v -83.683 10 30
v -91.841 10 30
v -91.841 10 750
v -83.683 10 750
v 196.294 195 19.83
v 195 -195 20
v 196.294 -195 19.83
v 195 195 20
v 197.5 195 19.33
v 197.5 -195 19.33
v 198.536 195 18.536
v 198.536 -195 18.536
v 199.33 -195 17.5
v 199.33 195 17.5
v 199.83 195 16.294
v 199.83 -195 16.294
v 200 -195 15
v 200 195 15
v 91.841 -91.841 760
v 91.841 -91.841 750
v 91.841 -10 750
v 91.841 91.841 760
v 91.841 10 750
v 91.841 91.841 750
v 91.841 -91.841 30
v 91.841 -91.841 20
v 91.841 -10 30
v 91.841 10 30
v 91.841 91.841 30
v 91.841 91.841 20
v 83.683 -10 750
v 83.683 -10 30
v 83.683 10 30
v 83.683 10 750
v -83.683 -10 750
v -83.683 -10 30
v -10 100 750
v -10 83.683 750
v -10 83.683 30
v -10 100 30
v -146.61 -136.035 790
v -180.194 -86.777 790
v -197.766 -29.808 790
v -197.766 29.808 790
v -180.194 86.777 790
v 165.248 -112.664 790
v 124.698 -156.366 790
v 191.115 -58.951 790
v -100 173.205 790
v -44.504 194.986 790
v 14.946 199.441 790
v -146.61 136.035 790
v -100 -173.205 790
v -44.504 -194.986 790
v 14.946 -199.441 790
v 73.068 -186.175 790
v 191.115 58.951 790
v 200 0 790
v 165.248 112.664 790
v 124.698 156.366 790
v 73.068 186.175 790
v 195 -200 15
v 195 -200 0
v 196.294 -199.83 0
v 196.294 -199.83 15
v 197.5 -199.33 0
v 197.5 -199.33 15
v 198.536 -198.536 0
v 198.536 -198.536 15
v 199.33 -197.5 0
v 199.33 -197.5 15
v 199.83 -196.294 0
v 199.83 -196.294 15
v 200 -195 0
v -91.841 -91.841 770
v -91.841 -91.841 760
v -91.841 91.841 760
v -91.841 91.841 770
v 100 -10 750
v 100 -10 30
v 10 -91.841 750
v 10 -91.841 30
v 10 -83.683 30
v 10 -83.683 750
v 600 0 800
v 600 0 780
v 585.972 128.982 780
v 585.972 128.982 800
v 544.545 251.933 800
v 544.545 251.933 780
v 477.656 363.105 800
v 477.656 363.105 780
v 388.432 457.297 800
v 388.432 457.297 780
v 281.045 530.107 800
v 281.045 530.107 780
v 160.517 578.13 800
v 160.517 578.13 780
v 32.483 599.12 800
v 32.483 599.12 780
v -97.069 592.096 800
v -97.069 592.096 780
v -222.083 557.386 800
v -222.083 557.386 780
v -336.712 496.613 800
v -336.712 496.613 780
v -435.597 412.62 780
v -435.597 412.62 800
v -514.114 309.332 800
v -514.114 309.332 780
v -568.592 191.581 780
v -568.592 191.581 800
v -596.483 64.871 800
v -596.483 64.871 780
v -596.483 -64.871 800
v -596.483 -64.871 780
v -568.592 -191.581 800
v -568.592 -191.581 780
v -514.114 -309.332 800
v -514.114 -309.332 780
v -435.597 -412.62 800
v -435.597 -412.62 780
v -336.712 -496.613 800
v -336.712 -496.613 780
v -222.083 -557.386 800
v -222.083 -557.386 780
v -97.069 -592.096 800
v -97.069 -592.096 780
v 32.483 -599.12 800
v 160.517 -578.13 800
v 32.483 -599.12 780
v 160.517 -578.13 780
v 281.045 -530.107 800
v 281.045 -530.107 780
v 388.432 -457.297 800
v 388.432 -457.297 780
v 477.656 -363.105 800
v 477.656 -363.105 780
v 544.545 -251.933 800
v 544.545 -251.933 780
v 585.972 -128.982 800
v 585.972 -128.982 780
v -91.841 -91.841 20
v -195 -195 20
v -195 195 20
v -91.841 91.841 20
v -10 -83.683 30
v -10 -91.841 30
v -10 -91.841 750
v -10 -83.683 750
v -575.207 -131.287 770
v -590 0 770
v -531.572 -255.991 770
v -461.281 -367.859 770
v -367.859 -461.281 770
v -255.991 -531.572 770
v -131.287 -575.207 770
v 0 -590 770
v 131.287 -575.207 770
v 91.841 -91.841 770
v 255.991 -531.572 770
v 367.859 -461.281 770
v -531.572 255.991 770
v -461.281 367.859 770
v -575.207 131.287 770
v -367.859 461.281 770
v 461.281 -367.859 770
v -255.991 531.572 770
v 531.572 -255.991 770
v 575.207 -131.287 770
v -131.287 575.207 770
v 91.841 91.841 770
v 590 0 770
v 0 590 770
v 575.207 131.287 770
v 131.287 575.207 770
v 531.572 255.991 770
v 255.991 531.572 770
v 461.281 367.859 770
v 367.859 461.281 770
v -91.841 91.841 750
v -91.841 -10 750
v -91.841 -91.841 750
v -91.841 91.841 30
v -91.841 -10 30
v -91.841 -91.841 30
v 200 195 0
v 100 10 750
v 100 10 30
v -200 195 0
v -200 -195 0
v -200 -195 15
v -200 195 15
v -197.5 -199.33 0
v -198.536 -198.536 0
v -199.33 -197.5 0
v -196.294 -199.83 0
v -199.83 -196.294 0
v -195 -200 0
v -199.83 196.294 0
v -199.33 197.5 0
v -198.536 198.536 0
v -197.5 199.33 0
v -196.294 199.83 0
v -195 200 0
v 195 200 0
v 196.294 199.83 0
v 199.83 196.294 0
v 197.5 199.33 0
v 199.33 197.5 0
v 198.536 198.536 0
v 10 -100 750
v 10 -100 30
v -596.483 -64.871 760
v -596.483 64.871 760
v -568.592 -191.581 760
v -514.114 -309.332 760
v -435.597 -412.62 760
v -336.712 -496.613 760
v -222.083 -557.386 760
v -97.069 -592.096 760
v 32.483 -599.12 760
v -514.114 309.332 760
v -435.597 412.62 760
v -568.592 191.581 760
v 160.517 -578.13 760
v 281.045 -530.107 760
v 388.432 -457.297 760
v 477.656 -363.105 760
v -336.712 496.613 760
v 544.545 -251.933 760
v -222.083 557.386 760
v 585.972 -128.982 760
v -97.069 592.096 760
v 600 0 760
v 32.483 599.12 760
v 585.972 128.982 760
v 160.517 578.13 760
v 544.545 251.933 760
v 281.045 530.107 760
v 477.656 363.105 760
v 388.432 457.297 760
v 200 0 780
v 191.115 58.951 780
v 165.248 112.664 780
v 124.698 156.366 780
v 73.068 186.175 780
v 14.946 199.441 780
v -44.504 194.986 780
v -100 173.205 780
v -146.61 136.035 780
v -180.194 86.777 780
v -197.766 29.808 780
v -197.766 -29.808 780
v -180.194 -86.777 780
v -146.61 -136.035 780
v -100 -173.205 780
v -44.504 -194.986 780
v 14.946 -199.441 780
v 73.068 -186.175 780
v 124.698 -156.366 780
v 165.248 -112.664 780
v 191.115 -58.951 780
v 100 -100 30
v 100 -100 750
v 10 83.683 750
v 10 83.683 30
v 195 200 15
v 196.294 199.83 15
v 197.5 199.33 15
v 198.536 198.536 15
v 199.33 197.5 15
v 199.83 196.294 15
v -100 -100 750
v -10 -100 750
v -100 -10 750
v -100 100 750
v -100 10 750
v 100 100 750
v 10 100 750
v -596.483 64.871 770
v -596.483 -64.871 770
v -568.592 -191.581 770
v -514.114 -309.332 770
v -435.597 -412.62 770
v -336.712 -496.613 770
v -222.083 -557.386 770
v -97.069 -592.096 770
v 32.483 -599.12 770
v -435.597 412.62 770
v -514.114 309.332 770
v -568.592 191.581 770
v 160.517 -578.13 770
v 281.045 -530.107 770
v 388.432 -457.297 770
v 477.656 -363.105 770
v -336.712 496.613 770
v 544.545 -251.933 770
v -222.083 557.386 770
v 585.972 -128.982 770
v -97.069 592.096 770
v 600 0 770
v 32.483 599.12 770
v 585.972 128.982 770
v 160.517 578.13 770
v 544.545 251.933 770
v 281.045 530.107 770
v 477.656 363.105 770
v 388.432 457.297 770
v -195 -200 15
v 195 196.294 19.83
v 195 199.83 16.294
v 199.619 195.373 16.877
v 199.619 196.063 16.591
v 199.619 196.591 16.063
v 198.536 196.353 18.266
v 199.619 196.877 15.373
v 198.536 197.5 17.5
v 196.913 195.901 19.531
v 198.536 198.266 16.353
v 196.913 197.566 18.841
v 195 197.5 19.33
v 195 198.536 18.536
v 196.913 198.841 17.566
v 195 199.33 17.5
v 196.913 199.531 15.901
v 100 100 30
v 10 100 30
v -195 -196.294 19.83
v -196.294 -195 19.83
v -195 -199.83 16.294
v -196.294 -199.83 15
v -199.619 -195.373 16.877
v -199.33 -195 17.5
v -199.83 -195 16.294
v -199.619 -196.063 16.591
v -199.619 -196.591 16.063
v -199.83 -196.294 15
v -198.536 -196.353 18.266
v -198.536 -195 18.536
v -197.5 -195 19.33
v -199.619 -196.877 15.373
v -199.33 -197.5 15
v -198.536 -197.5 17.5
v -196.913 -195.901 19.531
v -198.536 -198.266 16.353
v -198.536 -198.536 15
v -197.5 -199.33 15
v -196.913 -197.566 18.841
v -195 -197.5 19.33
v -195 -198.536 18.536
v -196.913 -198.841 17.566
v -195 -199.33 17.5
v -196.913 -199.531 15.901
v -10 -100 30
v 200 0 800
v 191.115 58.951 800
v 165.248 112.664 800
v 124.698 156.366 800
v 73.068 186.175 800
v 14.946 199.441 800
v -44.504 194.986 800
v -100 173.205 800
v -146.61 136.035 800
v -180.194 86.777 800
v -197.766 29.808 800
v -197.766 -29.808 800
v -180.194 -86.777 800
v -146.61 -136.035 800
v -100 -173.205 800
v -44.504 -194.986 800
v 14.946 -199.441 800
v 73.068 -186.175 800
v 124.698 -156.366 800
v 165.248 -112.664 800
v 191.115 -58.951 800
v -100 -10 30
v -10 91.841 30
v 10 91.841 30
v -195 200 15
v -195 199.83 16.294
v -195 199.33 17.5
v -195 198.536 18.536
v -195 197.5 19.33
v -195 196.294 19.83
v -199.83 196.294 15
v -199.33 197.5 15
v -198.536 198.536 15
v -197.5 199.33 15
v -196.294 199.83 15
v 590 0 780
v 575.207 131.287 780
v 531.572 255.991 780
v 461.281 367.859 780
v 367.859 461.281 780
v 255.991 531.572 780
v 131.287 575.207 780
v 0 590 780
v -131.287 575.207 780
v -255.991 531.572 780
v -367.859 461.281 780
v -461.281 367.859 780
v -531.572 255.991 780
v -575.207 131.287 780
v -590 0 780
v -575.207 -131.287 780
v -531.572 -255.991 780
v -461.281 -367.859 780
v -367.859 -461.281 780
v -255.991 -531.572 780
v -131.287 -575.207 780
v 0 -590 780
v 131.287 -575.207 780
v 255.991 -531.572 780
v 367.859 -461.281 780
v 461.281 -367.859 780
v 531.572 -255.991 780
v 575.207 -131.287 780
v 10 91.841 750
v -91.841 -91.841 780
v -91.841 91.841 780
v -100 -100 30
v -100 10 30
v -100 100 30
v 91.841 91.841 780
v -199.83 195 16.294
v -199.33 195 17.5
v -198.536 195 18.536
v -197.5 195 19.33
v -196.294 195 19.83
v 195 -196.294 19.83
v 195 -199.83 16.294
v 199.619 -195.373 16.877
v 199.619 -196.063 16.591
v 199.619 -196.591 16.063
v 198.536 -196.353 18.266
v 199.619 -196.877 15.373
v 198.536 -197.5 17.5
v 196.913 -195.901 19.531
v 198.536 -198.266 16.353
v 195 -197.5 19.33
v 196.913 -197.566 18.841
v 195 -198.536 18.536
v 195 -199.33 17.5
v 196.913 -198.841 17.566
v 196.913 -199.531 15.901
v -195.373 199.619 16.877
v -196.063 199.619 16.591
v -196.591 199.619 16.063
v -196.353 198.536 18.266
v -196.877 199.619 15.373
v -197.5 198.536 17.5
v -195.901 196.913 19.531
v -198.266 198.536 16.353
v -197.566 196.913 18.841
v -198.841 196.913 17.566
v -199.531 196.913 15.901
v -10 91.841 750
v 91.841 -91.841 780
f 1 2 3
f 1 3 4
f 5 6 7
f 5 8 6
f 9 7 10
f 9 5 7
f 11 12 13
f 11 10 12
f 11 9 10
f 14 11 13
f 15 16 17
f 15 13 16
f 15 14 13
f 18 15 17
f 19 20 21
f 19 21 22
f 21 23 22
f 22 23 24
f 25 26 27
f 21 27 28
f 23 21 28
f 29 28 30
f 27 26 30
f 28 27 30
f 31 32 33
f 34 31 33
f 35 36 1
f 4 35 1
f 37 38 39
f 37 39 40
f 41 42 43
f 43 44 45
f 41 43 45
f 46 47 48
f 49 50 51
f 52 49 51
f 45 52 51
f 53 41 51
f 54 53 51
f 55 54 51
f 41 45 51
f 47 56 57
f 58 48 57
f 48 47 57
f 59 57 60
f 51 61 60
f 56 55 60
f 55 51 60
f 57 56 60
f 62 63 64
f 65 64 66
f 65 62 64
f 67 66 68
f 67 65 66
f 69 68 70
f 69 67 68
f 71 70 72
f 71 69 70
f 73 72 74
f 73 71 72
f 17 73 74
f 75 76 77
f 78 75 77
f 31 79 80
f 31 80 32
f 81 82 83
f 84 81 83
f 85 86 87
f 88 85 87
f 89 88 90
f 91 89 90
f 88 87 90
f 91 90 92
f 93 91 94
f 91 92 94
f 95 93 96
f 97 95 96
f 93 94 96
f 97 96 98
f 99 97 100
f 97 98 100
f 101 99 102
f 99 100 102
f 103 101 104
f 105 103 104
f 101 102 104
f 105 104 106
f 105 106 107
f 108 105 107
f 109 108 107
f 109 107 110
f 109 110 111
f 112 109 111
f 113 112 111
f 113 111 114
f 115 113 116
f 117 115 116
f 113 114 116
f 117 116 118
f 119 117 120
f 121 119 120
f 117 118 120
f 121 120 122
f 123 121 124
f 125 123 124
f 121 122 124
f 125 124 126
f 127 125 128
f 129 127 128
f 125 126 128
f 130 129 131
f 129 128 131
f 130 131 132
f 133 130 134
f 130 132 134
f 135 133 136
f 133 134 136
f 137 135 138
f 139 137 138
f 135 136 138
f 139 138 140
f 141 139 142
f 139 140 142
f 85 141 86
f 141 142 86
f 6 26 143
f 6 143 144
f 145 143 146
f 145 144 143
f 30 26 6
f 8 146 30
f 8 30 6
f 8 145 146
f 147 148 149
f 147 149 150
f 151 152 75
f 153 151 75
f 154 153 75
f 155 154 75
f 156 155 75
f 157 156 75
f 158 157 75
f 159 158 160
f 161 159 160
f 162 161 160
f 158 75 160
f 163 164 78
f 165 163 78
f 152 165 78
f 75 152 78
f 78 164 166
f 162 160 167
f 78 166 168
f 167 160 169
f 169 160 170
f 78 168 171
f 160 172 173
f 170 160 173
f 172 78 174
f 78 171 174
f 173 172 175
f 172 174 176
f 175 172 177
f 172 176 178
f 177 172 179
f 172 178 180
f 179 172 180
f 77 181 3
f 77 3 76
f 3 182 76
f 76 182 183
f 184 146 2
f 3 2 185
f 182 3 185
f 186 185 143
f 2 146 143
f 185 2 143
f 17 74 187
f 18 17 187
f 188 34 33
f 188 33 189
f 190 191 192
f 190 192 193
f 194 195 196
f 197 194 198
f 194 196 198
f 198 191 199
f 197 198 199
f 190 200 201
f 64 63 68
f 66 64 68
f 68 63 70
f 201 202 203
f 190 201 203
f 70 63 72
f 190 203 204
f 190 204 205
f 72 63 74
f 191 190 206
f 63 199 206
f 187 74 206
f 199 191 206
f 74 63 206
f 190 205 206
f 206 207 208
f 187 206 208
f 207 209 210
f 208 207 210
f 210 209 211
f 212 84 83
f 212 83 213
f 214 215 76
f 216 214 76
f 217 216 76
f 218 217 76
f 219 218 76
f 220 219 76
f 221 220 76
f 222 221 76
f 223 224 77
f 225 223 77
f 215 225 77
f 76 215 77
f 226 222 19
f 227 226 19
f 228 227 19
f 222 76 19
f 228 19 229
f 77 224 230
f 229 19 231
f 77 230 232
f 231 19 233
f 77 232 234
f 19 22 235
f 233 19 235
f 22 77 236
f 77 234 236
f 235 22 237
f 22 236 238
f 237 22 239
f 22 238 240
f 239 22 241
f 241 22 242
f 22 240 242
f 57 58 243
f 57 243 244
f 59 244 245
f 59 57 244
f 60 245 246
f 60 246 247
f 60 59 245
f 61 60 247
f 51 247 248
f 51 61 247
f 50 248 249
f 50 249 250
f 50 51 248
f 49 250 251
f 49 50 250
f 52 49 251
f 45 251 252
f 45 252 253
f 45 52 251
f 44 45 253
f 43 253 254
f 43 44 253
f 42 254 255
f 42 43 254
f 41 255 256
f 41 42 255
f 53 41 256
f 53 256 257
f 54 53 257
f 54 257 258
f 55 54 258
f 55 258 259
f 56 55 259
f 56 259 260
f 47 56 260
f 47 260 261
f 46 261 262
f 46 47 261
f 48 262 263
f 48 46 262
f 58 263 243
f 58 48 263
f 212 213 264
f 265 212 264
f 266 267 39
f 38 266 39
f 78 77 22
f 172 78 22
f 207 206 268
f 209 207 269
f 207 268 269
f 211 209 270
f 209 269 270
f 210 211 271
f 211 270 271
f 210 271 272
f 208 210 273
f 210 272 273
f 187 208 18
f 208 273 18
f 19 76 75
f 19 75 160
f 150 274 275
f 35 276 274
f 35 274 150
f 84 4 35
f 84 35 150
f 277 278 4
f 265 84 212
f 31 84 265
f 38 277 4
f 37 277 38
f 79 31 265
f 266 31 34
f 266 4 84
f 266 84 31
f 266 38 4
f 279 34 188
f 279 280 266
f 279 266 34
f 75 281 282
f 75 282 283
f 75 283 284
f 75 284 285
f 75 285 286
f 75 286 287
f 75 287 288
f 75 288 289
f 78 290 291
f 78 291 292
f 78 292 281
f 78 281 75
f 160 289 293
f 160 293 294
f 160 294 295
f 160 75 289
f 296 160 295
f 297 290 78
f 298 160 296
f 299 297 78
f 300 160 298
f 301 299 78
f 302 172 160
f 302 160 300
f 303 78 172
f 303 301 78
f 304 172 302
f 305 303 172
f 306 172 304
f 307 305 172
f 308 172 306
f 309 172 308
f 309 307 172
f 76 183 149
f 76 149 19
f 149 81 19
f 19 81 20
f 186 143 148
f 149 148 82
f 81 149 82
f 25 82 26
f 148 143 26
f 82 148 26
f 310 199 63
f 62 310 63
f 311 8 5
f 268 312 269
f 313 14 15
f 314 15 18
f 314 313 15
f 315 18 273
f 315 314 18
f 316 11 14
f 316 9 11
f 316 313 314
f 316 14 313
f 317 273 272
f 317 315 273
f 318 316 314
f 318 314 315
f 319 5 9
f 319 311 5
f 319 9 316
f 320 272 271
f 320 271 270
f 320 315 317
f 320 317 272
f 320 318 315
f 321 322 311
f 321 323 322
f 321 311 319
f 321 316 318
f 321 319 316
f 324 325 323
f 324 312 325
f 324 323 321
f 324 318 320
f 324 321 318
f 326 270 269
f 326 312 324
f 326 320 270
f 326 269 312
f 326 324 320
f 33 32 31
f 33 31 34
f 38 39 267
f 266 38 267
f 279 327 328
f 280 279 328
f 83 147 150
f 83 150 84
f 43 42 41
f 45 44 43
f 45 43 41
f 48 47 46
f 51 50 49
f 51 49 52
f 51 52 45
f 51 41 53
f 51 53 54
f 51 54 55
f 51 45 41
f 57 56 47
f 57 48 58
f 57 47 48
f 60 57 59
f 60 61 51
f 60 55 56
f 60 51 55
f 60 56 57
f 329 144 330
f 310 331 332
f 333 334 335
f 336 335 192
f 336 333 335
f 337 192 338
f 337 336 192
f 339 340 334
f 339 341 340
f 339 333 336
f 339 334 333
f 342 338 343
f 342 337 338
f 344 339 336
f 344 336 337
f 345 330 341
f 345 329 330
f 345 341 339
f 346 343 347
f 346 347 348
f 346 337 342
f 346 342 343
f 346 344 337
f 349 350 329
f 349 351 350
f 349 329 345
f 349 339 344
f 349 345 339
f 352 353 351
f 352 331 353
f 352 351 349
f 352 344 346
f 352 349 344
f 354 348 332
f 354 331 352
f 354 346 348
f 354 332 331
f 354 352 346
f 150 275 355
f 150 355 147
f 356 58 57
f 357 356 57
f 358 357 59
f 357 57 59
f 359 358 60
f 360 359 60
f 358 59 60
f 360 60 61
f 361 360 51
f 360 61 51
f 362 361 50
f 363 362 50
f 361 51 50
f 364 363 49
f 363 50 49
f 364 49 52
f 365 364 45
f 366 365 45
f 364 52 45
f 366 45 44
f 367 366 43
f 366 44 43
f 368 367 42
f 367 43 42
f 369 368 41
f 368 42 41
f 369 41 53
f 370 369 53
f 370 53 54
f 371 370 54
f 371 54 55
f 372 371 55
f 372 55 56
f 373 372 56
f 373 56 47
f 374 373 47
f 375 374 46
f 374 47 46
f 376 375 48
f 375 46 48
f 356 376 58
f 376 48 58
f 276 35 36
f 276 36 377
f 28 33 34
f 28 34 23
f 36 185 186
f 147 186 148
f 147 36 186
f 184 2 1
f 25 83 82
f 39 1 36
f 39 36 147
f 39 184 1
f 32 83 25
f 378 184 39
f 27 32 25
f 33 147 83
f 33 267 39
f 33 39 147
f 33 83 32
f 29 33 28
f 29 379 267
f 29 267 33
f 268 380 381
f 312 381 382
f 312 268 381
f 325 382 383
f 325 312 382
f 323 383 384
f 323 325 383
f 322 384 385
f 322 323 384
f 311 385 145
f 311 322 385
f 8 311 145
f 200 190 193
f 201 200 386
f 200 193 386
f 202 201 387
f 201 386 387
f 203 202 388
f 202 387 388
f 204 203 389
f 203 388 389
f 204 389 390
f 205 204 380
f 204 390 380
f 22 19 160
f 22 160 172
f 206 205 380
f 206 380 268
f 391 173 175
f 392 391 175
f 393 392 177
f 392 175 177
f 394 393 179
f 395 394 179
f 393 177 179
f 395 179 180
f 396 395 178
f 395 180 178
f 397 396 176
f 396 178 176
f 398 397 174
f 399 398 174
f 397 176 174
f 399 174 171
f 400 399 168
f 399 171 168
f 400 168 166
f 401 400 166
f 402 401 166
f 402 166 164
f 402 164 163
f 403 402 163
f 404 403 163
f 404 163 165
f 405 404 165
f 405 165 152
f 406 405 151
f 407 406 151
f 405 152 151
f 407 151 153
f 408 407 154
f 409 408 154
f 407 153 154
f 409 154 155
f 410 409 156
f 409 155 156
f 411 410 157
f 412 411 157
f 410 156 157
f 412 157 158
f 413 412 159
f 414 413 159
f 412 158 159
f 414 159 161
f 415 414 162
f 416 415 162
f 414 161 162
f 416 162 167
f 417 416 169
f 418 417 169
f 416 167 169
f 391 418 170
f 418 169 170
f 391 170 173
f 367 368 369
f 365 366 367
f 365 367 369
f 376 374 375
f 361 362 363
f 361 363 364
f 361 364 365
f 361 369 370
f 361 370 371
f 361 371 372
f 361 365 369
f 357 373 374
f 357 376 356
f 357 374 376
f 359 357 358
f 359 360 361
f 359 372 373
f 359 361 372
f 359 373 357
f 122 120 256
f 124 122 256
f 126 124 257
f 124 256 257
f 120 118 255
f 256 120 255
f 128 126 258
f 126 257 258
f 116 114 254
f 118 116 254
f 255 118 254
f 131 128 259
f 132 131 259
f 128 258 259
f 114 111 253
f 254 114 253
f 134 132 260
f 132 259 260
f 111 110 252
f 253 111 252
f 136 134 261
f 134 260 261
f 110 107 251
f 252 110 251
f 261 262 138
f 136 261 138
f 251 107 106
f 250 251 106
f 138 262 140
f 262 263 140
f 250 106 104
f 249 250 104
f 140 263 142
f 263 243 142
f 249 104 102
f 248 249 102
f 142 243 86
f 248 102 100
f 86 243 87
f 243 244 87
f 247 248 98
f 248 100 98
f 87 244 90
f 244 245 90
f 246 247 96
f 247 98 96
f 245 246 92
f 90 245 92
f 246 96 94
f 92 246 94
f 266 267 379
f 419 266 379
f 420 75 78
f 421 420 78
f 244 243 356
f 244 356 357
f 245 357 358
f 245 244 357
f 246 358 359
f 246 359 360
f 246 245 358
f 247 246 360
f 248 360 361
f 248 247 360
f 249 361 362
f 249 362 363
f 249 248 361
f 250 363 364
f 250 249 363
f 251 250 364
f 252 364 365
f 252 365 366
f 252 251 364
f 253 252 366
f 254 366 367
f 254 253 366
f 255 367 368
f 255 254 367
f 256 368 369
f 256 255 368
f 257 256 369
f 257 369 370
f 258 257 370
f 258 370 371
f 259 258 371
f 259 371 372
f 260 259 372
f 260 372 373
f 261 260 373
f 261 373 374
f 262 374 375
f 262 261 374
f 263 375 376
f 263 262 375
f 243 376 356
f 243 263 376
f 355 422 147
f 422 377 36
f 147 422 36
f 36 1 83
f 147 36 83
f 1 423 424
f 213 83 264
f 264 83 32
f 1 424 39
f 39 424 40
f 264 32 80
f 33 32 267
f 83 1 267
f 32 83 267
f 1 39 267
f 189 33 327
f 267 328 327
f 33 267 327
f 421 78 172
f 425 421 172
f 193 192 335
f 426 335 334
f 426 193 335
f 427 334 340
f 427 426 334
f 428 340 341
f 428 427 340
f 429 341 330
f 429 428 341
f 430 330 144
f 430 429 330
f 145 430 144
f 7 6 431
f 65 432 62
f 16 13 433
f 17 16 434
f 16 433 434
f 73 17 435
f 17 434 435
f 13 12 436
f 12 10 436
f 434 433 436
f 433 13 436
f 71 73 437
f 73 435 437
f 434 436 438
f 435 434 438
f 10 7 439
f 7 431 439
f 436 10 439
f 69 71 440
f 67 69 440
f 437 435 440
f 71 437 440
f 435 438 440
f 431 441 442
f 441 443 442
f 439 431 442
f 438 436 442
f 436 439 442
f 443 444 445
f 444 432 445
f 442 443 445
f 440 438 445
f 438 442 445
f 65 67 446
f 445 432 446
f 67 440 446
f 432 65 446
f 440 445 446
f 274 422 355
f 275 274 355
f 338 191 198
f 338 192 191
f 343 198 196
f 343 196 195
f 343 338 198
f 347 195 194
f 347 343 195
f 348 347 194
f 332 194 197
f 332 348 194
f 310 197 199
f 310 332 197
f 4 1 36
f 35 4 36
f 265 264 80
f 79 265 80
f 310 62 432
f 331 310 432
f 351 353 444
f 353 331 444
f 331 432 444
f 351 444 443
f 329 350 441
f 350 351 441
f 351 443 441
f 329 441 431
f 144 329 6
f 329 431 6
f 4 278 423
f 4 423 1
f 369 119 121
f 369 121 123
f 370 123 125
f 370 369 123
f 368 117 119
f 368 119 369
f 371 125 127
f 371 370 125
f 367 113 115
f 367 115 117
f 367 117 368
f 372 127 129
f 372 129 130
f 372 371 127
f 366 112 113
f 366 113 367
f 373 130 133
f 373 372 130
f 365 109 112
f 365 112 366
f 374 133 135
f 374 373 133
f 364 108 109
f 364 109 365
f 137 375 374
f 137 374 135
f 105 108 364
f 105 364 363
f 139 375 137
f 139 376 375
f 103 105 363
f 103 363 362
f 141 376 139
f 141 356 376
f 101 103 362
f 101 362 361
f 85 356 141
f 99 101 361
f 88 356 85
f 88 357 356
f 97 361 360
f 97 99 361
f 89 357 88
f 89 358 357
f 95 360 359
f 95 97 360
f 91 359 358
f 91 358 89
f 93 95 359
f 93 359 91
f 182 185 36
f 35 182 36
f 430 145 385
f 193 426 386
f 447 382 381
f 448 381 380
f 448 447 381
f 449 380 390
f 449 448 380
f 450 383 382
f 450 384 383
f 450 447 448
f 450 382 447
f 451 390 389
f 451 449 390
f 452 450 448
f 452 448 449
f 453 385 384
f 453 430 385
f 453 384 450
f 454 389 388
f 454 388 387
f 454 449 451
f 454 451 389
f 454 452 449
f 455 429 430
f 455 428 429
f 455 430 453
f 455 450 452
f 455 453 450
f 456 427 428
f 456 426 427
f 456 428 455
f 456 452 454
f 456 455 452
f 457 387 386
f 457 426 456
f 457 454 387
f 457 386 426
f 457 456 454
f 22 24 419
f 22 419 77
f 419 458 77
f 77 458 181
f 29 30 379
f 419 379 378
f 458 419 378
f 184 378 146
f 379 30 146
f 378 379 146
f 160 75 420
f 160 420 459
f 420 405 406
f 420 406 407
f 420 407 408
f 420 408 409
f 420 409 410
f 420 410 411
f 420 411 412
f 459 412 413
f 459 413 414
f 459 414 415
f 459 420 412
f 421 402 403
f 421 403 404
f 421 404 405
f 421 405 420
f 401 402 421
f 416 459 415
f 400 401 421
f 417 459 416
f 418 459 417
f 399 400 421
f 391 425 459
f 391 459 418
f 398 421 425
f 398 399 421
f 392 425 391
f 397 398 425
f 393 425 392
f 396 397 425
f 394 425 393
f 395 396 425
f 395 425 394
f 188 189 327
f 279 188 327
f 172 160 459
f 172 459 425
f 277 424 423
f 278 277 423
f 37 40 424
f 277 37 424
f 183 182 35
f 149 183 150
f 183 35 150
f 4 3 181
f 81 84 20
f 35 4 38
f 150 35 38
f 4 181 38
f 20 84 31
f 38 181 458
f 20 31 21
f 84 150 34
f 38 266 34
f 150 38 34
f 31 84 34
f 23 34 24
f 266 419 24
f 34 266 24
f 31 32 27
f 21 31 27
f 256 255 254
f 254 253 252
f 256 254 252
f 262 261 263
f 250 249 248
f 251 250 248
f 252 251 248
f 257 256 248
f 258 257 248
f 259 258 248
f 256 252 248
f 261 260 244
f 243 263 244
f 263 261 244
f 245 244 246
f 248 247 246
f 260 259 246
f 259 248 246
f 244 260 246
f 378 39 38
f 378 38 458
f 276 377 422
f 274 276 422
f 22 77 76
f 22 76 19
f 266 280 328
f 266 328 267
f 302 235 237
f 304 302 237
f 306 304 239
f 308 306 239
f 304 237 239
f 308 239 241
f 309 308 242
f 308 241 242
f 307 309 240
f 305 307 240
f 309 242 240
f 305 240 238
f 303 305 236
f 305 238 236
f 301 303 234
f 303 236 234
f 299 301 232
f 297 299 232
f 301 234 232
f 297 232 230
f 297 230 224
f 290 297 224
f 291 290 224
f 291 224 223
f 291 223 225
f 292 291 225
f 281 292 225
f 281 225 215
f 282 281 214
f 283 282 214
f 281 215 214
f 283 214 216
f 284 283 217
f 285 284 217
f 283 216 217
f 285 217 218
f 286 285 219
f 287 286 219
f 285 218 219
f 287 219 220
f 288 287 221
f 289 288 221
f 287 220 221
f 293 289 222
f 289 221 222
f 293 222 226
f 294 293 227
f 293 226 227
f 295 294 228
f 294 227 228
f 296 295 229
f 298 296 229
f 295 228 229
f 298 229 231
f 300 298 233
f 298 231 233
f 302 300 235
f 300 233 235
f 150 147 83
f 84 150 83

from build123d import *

# Parameters (mm, degrees)
F1_START  = 30
F1_DEPTH  = 720
F2_START  = 30
F0_W      = 20
F0_H      = 8.1586758983
F2_DEPTH  = 720
F0_W_2    = 8.1586758983
F0_H_2    = 20
F3_START  = 20
F3_DEPTH  = 10
F4_START  = 750
F4_DEPTH  = 10
F0_W_3    = 400
F0_H_3    = 400
F5_DEPTH  = 20
F7_START  = 20
F6_R      = 600
F6_R_2    = 590
F6_R_3    = 200
F7_DEPTH  = 20
F8_START  = 10
F6_W      = 183.6826482035
F6_H      = 183.6826482035
F8_DEPTH  = 10
F9_DEPTH  = 10
F10_START = 30
F10_DEPTH = 10
F11_DEPTH = 10
F12_R     = 5


with BuildPart() as f1:
    # F0 (on Top) → F1 (new body)
    with BuildSketch(Plane.XY.offset(F1_START)):
        Polygon((10, 83.6826482035), (-10, 83.6826482035), (-10, 91.8413241017), (-91.8413241017, 91.8413241017), (-91.8413241017, 10), (-83.6826482035, 10), (-83.6826482035, -10), (-91.8413241017, -10), (-91.8413241017, -91.8413241017), (-10, -91.8413241017), (-10, -83.6826482035), (10, -83.6826482035), (10, -91.8413241017), (91.8413241017, -91.8413241017), (91.8413241017, -10), (83.6826482035, -10), (83.6826482035, 10), (91.8413241017, 10), (91.8413241017, 91.8413241017), (10, 91.8413241017), align=None)
        Polygon((-91.8413241017, 91.8413241017), (-10, 91.8413241017), (-10, 100), (-100, 100), (-100, 10), (-91.8413241017, 10), align=None)
        Polygon((-91.8413241017, -91.8413241017), (-91.8413241017, -10), (-100, -10), (-100, -100), (-10, -100), (-10, -91.8413241017), align=None)
        Polygon((100, -10), (91.8413241017, -10), (91.8413241017, -91.8413241017), (10, -91.8413241017), (10, -100), (100, -100), align=None)
        Polygon((10, 100), (10, 91.8413241017), (91.8413241017, 91.8413241017), (91.8413241017, 10), (100, 10), (100, 100), align=None)
    extrude(amount=F1_DEPTH)


with BuildPart() as f2:
    # F0 (on Top) → F2 (new body)
    with BuildSketch(Plane.XY.offset(F2_START)):
        with Locations((0, -87.7619861526)):
            Rectangle(F0_W, F0_H)
    extrude(amount=F2_DEPTH)



with BuildPart() as f2b:
    # F0 (on Top) → F2, piece 2 (new body)
    with BuildSketch(Plane.XY.offset(F2_START)):
        with Locations((87.7619861526, 0)):
            Rectangle(F0_W_2, F0_H_2)
    extrude(amount=F2_DEPTH)


with BuildPart() as f2c:
    # F0 (on Top) → F2, piece 3 (new body)
    with BuildSketch(Plane.XY.offset(F2_START)):
        with Locations((0, 87.7619861526)):
            Rectangle(F0_W, F0_H)
    extrude(amount=F2_DEPTH)


with BuildPart() as f2d:
    # F0 (on Top) → F2, piece 4 (new body)
    with BuildSketch(Plane.XY.offset(F2_START)):
        with Locations((-87.7619861526, 0)):
            Rectangle(F0_W_2, F0_H_2)
    extrude(amount=F2_DEPTH)


with BuildPart() as f2_1:
    add(f2.part)

    add(f2b.part)  # F3 merges F2b

    add(f2c.part)  # F3 merges F2c

    add(f2d.part)  # F3 merges F2d
    # F0 (on Top) → F3 (join)
    with BuildSketch(Plane.XY.offset(F3_START)):
        Polygon((10, 83.6826482035), (-10, 83.6826482035), (-10, 91.8413241017), (-91.8413241017, 91.8413241017), (-91.8413241017, 10), (-83.6826482035, 10), (-83.6826482035, -10), (-91.8413241017, -10), (-91.8413241017, -91.8413241017), (-10, -91.8413241017), (-10, -83.6826482035), (10, -83.6826482035), (10, -91.8413241017), (91.8413241017, -91.8413241017), (91.8413241017, -10), (83.6826482035, -10), (83.6826482035, 10), (91.8413241017, 10), (91.8413241017, 91.8413241017), (10, 91.8413241017), align=None)
        with Locations((0, -87.7619861526)):
            Rectangle(F0_W, F0_H)
        with Locations((87.7619861526, 0)):
            Rectangle(F0_W_2, F0_H_2)
        with Locations((0, 87.7619861526)):
            Rectangle(F0_W, F0_H)
        with Locations((-87.7619861526, 0)):
            Rectangle(F0_W_2, F0_H_2)
    extrude(amount=F3_DEPTH)

    # F0 (on Top) → F4 (join)
    with BuildSketch(Plane.XY.offset(F4_START)):
        Polygon((10, 83.6826482035), (-10, 83.6826482035), (-10, 91.8413241017), (-91.8413241017, 91.8413241017), (-91.8413241017, 10), (-83.6826482035, 10), (-83.6826482035, -10), (-91.8413241017, -10), (-91.8413241017, -91.8413241017), (-10, -91.8413241017), (-10, -83.6826482035), (10, -83.6826482035), (10, -91.8413241017), (91.8413241017, -91.8413241017), (91.8413241017, -10), (83.6826482035, -10), (83.6826482035, 10), (91.8413241017, 10), (91.8413241017, 91.8413241017), (10, 91.8413241017), align=None)
        with Locations((0, 87.7619861526)):
            Rectangle(F0_W, F0_H)
        with Locations((-87.7619861526, 0)):
            Rectangle(F0_W_2, F0_H_2)
        with Locations((0, -87.7619861526)):
            Rectangle(F0_W, F0_H)
        with Locations((87.7619861526, 0)):
            Rectangle(F0_W_2, F0_H_2)
    extrude(amount=F4_DEPTH)

    # F0 (on Top) → F5 (join)
    with BuildSketch(Plane.XY):
        Rectangle(F0_W_3, F0_H_3)
        Polygon((-10, 100), (-10, 91.8413241017), (10, 91.8413241017), (10, 100), (100, 100), (100, 10), (91.8413241017, 10), (91.8413241017, -10), (100, -10), (100, -100), (10, -100), (10, -91.8413241017), (-10, -91.8413241017), (-10, -100), (-100, -100), (-100, -10), (-91.8413241017, -10), (-91.8413241017, 10), (-100, 10), (-100, 100), align=None, mode=Mode.SUBTRACT)
        Polygon((-91.8413241017, 91.8413241017), (-10, 91.8413241017), (-10, 100), (-100, 100), (-100, 10), (-91.8413241017, 10), align=None)
        Polygon((10, 100), (10, 91.8413241017), (91.8413241017, 91.8413241017), (91.8413241017, 10), (100, 10), (100, 100), align=None)
        Polygon((100, -10), (91.8413241017, -10), (91.8413241017, -91.8413241017), (10, -91.8413241017), (10, -100), (100, -100), align=None)
        Polygon((-91.8413241017, -91.8413241017), (-91.8413241017, -10), (-100, -10), (-100, -100), (-10, -100), (-10, -91.8413241017), align=None)
        with Locations((-87.7619861526, 0)):
            Rectangle(F0_W_2, F0_H_2)
        with Locations((0, 87.7619861526)):
            Rectangle(F0_W, F0_H)
        with Locations((87.7619861526, 0)):
            Rectangle(F0_W_2, F0_H_2)
        with Locations((0, -87.7619861526)):
            Rectangle(F0_W, F0_H)
        Polygon((10, 83.6826482035), (-10, 83.6826482035), (-10, 91.8413241017), (-91.8413241017, 91.8413241017), (-91.8413241017, 10), (-83.6826482035, 10), (-83.6826482035, -10), (-91.8413241017, -10), (-91.8413241017, -91.8413241017), (-10, -91.8413241017), (-10, -83.6826482035), (10, -83.6826482035), (10, -91.8413241017), (91.8413241017, -91.8413241017), (91.8413241017, -10), (83.6826482035, -10), (83.6826482035, 10), (91.8413241017, 10), (91.8413241017, 91.8413241017), (10, 91.8413241017), align=None)
    extrude(amount=F5_DEPTH)

    # F12
    f12_edges = [f2_1.edges().sort_by_distance(p)[0] for p in [
        (0, -200, 20),
        (-200, 0, 20),
        (0, 200, 20),
        (200, 0, 20),
        (200, 200, 10),
        (-200, 200, 10),
        (-200, -200, 10),
        (200, -200, 10),
    ]]
    fillet(f12_edges, radius=F12_R)


with BuildPart() as f7:
    # F6 (on face) → F7 (new body)
    with BuildSketch(Plane.XY.offset(760).offset(F7_START)):
        Circle(F6_R)
        Circle(F6_R_2, mode=Mode.SUBTRACT)
        Circle(F6_R_2)
        Circle(F6_R_3, mode=Mode.SUBTRACT)
    extrude(amount=F7_DEPTH)


with BuildPart() as f8:
    # F6 (on face) → F8 (new body)
    with BuildSketch(Plane.XY.offset(760).offset(F8_START)):
        Circle(F6_R_2)
        Circle(F6_R_3, mode=Mode.SUBTRACT)
        Circle(F6_R_3)
        Rectangle(F6_W, F6_H, mode=Mode.SUBTRACT)
    extrude(amount=F8_DEPTH)


with BuildPart() as f9:
    # F6 (on face) → F9 (new body)
    with BuildSketch(Plane.XY.offset(760)):
        Circle(F6_R)
        Circle(F6_R_2, mode=Mode.SUBTRACT)
        Circle(F6_R_2)
        Circle(F6_R_3, mode=Mode.SUBTRACT)
        Circle(F6_R_3)
        Rectangle(F6_W, F6_H, mode=Mode.SUBTRACT)
    extrude(amount=F9_DEPTH)


with BuildPart() as f10:
    # F6 (on face) → F10 (new body)
    with BuildSketch(Plane.XY.offset(760).offset(F10_START)):
        Circle(F6_R_3)
        Rectangle(F6_W, F6_H, mode=Mode.SUBTRACT)
        Rectangle(F6_W, F6_H)
    extrude(amount=F10_DEPTH)


with BuildPart() as f11:
    # F11 (new): a face of the model
    f11_faces = [f10.part.faces().sort_by_distance(p)[0] for p in [
        (0, 0, 790),
    ]]
    extrude(f11_faces, amount=F11_DEPTH)


solid = Compound([f1.part, f2_1.part, f7.part, f8.part, f9.part, f10.part, f11.part])
